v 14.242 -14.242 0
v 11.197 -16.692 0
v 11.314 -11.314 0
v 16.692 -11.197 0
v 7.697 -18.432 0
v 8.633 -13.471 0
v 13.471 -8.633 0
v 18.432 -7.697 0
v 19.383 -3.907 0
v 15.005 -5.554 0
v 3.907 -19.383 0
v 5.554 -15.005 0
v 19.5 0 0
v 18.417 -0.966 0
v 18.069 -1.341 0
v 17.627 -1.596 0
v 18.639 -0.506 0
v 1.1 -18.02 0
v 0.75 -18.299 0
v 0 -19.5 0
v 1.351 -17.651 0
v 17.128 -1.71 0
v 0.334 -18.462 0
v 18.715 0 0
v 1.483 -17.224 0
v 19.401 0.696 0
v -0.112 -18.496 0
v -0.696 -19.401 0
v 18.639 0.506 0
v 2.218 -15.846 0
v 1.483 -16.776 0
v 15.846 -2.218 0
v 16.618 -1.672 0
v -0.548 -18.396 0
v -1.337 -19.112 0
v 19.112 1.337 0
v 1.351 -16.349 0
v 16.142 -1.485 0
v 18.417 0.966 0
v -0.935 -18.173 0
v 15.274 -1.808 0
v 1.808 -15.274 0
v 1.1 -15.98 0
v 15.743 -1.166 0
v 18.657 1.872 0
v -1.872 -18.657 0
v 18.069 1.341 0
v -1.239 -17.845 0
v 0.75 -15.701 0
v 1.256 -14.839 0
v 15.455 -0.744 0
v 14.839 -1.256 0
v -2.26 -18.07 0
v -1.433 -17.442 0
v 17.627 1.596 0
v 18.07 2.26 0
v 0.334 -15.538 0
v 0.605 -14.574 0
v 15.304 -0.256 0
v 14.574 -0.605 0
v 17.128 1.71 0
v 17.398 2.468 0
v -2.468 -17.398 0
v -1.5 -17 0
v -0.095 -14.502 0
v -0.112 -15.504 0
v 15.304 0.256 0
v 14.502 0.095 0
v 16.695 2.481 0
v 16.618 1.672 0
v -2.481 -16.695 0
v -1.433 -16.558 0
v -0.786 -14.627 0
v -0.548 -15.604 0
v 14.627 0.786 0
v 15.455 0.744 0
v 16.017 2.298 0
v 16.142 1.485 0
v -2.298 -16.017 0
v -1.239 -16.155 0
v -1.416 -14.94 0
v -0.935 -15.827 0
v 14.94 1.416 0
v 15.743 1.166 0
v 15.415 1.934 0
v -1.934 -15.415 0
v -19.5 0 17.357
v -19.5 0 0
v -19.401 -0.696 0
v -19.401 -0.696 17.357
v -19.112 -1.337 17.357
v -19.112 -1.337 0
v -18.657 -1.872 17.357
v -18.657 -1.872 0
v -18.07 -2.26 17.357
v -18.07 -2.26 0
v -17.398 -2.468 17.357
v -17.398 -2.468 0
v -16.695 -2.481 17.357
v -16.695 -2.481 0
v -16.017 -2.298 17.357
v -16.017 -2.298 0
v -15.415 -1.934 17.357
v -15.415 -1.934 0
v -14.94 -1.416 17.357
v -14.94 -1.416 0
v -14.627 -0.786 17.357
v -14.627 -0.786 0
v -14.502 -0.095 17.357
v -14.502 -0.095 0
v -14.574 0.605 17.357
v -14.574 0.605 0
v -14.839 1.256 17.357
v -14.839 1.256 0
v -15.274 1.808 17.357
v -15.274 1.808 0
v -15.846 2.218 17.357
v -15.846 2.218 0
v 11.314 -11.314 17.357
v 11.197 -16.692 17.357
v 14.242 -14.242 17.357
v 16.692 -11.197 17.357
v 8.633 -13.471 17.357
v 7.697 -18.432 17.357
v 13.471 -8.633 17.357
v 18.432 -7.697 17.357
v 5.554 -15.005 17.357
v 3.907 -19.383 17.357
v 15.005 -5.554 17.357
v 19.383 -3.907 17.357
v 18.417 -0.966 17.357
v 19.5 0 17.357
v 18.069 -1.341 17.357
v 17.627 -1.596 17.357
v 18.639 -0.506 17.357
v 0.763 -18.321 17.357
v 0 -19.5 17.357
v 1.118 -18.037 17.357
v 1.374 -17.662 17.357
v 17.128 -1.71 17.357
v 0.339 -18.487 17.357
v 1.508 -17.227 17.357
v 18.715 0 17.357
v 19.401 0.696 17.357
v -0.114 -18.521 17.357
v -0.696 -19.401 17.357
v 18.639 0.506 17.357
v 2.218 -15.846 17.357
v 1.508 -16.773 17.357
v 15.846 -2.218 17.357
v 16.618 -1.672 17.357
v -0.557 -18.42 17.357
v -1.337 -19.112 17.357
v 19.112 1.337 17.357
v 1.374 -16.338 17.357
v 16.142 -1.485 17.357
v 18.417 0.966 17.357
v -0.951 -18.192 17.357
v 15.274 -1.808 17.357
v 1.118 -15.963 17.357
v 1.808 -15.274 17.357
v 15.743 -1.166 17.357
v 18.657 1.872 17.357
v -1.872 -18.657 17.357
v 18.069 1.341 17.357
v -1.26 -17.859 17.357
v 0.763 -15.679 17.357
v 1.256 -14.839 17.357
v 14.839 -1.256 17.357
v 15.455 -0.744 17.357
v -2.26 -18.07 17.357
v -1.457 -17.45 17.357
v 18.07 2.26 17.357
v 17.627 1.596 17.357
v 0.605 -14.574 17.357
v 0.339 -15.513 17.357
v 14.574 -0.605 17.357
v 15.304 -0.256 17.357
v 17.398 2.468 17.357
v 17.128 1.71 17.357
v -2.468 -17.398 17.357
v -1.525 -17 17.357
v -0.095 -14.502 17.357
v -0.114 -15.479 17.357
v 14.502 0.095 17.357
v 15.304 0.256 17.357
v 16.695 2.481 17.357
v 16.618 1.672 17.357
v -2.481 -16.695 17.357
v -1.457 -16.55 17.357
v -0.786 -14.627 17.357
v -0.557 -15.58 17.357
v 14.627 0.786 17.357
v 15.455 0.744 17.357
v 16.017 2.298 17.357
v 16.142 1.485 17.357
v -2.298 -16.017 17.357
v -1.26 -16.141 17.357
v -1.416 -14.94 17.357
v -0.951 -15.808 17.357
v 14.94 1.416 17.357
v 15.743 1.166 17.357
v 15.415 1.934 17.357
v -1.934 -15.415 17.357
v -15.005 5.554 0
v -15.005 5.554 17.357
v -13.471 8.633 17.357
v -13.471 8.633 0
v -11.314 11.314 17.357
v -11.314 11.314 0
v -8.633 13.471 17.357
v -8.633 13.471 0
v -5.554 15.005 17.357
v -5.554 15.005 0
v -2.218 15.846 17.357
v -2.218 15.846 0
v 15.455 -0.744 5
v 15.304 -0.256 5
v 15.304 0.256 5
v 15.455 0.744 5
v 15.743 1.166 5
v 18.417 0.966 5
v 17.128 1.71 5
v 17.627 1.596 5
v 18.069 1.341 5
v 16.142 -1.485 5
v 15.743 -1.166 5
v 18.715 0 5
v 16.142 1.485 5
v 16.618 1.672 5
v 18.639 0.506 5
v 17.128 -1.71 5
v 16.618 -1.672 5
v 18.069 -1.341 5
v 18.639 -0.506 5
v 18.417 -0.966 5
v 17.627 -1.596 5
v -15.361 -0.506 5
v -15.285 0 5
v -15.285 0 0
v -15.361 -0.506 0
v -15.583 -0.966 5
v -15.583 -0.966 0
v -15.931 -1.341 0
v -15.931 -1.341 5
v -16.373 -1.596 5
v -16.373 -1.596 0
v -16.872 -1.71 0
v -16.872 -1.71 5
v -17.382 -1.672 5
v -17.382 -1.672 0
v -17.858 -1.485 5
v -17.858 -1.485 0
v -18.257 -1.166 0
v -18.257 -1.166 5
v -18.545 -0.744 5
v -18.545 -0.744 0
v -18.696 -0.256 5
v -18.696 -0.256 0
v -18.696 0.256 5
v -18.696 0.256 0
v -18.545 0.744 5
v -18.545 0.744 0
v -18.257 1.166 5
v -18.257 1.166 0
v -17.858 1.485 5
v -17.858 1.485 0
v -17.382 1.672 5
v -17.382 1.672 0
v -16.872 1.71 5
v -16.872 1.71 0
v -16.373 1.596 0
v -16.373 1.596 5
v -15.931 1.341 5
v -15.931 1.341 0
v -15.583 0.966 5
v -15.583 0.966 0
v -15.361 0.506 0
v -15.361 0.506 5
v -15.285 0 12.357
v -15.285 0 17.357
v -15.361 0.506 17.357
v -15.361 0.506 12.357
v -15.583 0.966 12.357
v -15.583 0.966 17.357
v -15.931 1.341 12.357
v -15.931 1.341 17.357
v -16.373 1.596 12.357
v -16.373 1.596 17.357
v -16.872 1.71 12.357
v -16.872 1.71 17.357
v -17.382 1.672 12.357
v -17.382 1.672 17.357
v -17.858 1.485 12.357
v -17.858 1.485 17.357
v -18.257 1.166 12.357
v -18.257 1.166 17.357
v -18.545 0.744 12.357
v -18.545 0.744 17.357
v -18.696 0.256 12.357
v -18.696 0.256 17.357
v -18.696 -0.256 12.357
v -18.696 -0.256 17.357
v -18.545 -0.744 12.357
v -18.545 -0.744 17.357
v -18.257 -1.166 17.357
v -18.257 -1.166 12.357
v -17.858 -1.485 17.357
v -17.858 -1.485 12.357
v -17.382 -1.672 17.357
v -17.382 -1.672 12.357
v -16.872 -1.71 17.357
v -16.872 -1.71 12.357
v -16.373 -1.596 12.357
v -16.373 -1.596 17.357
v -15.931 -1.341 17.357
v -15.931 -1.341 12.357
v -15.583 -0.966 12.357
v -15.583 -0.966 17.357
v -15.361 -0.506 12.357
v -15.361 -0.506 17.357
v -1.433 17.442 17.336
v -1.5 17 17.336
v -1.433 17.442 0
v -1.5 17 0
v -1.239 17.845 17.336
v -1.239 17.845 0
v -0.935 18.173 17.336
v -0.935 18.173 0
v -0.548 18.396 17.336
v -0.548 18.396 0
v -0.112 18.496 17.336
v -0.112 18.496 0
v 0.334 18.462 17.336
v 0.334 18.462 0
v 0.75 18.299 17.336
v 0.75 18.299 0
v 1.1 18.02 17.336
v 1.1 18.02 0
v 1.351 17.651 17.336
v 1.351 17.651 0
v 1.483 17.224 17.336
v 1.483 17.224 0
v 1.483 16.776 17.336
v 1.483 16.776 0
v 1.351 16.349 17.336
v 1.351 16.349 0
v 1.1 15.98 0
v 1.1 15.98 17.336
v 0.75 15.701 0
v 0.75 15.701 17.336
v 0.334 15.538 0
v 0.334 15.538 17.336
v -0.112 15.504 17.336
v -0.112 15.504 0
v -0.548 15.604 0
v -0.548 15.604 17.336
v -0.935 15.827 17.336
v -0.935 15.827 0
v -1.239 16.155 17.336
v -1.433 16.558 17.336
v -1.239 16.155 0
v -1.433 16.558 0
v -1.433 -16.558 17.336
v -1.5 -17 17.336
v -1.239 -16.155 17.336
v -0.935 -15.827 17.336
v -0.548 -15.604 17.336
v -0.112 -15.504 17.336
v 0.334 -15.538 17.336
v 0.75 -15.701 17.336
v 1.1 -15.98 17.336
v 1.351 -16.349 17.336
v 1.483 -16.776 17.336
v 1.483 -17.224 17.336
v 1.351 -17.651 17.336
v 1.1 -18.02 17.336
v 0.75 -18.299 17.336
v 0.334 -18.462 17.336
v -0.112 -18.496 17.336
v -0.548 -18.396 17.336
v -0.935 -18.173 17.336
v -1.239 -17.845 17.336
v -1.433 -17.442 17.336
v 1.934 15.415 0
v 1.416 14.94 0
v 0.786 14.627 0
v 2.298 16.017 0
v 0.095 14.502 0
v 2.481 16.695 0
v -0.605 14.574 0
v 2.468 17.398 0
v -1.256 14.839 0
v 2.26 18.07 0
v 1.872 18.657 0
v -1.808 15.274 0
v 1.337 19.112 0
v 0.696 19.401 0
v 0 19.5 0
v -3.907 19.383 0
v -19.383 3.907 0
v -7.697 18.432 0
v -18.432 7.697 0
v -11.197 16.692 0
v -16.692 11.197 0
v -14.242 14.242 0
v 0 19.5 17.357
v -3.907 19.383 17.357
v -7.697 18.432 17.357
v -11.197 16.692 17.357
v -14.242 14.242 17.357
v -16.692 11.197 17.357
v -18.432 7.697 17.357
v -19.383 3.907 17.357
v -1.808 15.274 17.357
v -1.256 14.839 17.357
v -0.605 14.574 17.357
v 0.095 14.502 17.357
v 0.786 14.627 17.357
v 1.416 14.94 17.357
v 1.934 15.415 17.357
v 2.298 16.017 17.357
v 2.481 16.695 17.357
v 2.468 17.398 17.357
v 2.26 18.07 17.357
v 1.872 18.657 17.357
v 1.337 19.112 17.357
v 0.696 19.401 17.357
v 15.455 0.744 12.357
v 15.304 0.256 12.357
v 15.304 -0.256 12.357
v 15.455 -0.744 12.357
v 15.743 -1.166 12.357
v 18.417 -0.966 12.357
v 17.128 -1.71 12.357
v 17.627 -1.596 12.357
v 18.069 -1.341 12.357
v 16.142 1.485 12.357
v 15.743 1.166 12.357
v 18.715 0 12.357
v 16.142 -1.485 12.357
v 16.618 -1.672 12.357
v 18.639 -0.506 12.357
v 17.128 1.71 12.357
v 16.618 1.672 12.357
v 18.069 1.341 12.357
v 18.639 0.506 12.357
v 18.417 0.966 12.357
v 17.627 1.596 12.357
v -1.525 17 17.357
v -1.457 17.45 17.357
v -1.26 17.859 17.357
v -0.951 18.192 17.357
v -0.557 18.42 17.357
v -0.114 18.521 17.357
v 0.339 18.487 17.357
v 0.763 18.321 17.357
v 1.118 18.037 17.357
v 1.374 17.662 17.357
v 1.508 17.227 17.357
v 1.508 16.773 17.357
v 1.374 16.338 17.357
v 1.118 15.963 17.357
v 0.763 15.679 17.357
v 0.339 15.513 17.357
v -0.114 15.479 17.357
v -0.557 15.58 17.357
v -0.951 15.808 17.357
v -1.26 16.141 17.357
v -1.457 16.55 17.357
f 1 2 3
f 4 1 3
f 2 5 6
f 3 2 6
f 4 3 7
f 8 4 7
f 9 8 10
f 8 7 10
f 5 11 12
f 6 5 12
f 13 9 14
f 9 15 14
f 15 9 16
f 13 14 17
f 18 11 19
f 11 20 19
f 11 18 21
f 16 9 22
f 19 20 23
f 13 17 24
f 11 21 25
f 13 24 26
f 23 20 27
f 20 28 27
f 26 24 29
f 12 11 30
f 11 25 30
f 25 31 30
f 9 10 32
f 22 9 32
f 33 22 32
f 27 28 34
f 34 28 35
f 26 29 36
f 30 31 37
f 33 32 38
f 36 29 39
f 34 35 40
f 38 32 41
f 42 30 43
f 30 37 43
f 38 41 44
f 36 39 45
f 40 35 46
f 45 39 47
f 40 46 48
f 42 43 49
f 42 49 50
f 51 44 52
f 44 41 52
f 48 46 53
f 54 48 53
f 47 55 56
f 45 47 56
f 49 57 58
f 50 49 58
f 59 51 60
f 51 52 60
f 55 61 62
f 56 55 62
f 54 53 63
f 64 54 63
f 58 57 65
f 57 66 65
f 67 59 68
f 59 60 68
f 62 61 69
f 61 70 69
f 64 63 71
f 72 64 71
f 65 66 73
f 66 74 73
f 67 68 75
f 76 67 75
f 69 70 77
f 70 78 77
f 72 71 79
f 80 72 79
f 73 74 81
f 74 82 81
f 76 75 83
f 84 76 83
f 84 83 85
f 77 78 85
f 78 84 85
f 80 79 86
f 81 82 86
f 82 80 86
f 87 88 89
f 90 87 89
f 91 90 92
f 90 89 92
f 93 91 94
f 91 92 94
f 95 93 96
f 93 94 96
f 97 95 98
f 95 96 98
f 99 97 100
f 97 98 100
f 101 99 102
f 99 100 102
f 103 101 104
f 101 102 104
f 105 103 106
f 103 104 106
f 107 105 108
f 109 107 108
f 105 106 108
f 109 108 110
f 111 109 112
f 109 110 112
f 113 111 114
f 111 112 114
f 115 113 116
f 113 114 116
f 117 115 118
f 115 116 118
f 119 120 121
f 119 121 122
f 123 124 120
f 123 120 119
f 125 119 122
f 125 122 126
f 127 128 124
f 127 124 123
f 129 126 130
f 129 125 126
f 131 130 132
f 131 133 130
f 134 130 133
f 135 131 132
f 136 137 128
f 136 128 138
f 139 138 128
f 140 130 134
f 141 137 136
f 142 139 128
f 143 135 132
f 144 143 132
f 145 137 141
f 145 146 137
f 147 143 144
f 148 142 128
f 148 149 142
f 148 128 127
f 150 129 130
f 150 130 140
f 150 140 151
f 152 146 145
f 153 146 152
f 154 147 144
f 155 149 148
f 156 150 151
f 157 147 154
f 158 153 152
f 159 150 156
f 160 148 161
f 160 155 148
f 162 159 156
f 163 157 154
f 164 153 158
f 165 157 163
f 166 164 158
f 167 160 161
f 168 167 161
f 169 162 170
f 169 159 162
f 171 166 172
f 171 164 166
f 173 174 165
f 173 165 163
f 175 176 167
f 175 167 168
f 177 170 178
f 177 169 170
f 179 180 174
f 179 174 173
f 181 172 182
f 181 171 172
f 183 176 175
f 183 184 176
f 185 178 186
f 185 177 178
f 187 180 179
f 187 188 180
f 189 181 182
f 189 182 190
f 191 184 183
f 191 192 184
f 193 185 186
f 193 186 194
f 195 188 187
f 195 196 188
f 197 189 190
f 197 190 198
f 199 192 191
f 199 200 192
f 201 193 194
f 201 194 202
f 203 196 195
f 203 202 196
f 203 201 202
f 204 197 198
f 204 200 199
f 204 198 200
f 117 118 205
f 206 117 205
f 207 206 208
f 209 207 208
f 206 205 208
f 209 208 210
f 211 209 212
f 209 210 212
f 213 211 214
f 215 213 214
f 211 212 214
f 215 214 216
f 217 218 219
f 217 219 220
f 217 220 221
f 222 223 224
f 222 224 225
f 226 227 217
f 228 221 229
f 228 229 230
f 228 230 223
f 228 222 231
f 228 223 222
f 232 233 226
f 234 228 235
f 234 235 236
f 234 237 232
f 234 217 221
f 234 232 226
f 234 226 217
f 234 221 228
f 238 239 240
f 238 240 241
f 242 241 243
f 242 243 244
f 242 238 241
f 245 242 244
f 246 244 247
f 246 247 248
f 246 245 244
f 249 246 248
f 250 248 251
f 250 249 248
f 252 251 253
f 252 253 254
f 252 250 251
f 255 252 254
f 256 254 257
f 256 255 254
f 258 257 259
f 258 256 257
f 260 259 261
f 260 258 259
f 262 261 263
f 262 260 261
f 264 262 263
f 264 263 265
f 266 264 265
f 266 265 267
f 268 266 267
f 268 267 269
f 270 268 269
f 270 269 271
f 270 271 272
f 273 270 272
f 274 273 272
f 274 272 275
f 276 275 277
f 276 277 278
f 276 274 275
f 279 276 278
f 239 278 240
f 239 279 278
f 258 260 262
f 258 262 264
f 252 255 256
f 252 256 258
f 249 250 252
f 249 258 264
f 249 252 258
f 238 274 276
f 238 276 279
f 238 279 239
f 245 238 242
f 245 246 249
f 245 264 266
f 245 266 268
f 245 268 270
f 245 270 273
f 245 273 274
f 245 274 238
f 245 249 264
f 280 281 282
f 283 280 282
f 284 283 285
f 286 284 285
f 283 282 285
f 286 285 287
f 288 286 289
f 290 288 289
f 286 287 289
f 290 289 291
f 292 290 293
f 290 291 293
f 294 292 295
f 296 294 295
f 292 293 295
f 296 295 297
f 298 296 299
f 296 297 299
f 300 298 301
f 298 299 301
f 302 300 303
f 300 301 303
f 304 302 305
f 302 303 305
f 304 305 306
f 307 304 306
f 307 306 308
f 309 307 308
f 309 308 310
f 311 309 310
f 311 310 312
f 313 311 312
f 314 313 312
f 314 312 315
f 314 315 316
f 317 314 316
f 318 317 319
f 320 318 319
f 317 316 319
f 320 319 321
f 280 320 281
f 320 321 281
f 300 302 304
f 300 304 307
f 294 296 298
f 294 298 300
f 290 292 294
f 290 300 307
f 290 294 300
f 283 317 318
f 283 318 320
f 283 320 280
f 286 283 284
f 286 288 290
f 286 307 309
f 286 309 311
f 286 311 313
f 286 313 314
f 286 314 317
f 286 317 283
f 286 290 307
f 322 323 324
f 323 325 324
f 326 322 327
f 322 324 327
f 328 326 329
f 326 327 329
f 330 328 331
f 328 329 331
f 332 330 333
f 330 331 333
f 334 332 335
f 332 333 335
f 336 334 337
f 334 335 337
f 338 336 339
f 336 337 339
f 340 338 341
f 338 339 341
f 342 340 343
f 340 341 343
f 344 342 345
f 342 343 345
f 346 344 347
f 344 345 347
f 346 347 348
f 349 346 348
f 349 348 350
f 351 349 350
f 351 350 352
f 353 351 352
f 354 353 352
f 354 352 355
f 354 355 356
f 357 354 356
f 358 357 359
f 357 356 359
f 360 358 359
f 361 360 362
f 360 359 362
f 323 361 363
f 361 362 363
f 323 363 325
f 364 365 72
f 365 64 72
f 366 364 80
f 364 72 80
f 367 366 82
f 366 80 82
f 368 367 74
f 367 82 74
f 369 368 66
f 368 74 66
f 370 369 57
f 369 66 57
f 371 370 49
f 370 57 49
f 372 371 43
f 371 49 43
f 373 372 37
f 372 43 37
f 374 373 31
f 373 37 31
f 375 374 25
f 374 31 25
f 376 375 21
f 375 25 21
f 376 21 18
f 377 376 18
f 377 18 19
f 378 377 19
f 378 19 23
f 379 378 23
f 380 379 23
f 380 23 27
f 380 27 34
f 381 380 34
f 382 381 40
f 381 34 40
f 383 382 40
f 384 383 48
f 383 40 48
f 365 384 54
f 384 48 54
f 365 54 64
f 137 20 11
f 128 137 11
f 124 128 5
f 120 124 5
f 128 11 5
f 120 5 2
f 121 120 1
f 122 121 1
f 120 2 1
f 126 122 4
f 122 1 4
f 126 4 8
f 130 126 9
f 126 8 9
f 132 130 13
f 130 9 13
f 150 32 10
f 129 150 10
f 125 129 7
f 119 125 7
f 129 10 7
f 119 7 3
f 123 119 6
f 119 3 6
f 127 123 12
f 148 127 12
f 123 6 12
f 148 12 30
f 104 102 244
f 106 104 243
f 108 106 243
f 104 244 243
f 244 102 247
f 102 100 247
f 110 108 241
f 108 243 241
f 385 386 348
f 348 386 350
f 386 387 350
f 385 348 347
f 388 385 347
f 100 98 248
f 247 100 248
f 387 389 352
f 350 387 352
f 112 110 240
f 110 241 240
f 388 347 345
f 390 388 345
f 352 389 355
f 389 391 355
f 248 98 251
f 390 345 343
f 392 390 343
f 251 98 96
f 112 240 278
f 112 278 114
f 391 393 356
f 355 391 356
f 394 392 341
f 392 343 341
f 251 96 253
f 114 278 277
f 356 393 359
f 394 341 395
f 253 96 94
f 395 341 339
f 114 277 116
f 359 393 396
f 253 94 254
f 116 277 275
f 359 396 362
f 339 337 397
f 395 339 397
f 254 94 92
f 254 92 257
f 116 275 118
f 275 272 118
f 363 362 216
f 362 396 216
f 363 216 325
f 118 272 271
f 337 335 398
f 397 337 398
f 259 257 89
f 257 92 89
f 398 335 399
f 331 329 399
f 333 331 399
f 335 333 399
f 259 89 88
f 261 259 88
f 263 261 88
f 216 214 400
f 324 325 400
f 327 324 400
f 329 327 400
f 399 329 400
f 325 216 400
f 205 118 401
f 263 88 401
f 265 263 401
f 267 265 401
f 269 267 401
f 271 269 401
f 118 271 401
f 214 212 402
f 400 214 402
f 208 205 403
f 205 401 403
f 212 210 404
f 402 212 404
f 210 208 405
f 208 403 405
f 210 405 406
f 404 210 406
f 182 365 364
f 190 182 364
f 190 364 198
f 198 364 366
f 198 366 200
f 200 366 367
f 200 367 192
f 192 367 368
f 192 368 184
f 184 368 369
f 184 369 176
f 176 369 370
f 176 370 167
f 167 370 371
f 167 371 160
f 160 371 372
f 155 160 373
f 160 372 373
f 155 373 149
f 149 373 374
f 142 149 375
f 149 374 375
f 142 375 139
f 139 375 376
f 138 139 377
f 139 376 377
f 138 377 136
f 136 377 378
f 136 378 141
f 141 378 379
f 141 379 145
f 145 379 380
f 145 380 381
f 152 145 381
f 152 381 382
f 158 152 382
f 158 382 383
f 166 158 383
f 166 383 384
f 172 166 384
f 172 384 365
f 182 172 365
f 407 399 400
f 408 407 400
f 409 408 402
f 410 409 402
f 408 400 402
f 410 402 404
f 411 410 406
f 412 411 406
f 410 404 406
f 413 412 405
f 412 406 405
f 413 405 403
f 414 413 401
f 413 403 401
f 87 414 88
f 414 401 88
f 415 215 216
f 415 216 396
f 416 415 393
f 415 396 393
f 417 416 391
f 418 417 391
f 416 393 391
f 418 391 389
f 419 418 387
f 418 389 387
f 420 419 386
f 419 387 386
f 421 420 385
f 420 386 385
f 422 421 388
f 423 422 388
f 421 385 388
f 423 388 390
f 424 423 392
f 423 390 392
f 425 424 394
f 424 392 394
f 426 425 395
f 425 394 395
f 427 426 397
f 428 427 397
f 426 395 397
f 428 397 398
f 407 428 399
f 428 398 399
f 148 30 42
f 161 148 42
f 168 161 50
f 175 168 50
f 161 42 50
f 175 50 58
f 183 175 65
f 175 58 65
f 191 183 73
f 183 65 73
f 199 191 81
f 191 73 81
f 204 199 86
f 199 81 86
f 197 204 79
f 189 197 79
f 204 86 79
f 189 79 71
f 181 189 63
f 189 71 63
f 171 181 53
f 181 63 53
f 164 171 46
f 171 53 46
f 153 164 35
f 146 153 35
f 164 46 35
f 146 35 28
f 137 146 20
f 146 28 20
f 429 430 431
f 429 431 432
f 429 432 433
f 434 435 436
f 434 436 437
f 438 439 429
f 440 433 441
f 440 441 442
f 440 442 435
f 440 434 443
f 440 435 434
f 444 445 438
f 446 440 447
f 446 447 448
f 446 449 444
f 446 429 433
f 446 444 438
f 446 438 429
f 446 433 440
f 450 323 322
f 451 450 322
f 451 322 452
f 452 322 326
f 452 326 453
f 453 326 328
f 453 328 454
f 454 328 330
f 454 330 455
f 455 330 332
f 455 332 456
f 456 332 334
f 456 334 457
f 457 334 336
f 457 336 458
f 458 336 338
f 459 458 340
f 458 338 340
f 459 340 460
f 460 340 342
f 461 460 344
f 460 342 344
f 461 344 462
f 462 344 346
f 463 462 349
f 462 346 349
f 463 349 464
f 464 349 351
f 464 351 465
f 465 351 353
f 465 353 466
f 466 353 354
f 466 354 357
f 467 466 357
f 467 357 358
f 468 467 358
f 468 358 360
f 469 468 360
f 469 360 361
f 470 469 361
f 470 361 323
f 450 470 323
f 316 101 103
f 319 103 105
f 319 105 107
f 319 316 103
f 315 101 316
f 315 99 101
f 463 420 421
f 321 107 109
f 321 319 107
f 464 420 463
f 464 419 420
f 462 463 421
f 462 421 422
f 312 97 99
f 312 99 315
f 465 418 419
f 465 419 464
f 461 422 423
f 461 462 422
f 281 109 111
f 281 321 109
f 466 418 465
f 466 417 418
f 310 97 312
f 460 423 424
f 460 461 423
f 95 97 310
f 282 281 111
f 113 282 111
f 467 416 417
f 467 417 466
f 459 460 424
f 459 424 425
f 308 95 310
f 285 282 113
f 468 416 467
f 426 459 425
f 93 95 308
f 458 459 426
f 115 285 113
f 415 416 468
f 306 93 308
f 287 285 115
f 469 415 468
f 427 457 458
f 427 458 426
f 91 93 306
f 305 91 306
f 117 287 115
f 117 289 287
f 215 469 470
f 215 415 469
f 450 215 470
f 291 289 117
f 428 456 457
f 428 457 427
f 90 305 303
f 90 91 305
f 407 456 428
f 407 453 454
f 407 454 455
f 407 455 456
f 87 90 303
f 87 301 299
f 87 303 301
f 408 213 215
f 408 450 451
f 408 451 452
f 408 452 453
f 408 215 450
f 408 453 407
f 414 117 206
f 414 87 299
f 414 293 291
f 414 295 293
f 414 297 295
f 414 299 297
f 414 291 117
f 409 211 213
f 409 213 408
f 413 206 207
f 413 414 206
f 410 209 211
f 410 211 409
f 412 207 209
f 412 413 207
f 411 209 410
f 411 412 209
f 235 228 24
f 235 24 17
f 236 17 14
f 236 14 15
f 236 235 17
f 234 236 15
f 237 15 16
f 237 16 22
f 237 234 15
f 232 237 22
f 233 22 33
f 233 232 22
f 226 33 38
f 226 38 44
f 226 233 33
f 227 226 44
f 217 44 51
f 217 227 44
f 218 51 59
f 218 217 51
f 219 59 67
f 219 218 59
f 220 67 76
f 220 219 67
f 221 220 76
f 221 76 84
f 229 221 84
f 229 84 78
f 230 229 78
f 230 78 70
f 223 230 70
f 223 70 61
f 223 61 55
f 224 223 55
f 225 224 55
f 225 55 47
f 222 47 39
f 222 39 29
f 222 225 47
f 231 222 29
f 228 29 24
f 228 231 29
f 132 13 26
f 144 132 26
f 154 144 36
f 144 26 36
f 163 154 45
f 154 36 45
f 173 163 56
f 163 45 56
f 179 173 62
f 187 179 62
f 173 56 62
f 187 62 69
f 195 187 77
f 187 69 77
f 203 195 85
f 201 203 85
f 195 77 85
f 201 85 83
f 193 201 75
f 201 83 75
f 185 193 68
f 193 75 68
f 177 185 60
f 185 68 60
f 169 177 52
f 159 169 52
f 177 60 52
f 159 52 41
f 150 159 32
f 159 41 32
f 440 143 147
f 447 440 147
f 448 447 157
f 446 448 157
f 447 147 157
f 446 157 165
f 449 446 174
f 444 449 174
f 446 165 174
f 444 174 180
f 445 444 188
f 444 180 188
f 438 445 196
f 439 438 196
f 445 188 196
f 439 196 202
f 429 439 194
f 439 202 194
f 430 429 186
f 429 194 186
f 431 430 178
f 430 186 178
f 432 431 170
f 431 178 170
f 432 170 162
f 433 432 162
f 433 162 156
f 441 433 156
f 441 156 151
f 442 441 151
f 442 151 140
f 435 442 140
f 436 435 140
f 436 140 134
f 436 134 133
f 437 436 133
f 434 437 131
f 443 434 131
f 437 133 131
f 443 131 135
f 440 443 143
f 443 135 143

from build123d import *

# Parameters (mm, degrees)
SKETCH1_R                       = 2.5
BOSS_EXTRUDE1_DEPTH             = 17.3574
F_3_0MM_DOWEL_HOLE1_D           = 3
F_3_0MM_DOWEL_HOLE1_CSINK_D     = 3.05
F_3_0MM_DOWEL_HOLE1_CSINK_ANGLE = 100
SKETCH6_R                       = 1.715
CUT_EXTRUDE1_DEPTH              = 5
CUT_EXTRUDE2_START              = -5
SKETCH7_R                       = 1.715
CUT_EXTRUDE2_DEPTH              = 5


with BuildPart() as part:
    # Sketch1 → Boss-Extrude1 (new body)
    with BuildSketch(Plane(origin=(0, 0, 0), x_dir=(0, 1, 0), z_dir=(0, 0, 1))):
        with Locations((0, 17)):
            Circle(SKETCH1_R)
        with BuildLine():
            ThreePointArc((0, 19.5), (1.767766953, 18.767766953), (2.5, 17))
            ThreePointArc((2.5, 17), (2.428349784, 16.405763241), (2.217506139, 15.845588235))
            ThreePointArc((2.217506139, 15.845588235), (11.313708499, 11.313708499), (15.845588235, 2.217506139))
            ThreePointArc((15.845588235, 2.217506139), (18.296913757, 2.137291441), (19.5, 0))
            ThreePointArc((19.5, 0), (14.241833588, 14.241833588), (0, 19.5))
        make_face()
        with Locations((17, 0)):
            Circle(SKETCH1_R)
        with Locations((-17, 0)):
            Circle(SKETCH1_R)
        with Locations((0, -17)):
            Circle(SKETCH1_R)
        with BuildLine():
            ThreePointArc((0, -19.5), (-2.137291441, -18.296913757), (-2.217506139, -15.845588235))
            ThreePointArc((-2.217506139, -15.845588235), (-11.313708499, -11.313708499), (-15.845588235, -2.217506139))
            ThreePointArc((-15.845588235, -2.217506139), (-18.296913757, -2.137291441), (-19.5, 0))
            ThreePointArc((-19.5, 0), (-14.241833588, -14.241833588), (0, -19.5))
        make_face()
    extrude(amount=BOSS_EXTRUDE1_DEPTH)

    # Ø3.0mm Dowel Hole1 (through all)
    with Locations(Plane.XY.offset(17.3574)):
        with Locations((0, 17), (0, -17)):
            CounterSinkHole(F_3_0MM_DOWEL_HOLE1_D / 2, F_3_0MM_DOWEL_HOLE1_CSINK_D / 2, counter_sink_angle=F_3_0MM_DOWEL_HOLE1_CSINK_ANGLE)

    # Sketch6 → Cut-Extrude1 (cut)
    with BuildSketch(Plane.XY.offset(17.3574)):
        with Locations((-17, 0)):
            Circle(SKETCH6_R)
        with Locations((17, 0)):
            Circle(SKETCH6_R)
    extrude(amount=-CUT_EXTRUDE1_DEPTH, mode=Mode.SUBTRACT)

    # Sketch7 → Cut-Extrude2 (cut)
    with BuildSketch(Plane(origin=(0, 0, 0), x_dir=(1, 0, 0), z_dir=(0, 0, -1)).offset(CUT_EXTRUDE2_START)):
        with Locations((-17, 0)):
            Circle(SKETCH7_R)
        with Locations((17, 0)):
            Circle(SKETCH7_R)
    extrude(amount=CUT_EXTRUDE2_DEPTH, mode=Mode.SUBTRACT)


solid = part.part
